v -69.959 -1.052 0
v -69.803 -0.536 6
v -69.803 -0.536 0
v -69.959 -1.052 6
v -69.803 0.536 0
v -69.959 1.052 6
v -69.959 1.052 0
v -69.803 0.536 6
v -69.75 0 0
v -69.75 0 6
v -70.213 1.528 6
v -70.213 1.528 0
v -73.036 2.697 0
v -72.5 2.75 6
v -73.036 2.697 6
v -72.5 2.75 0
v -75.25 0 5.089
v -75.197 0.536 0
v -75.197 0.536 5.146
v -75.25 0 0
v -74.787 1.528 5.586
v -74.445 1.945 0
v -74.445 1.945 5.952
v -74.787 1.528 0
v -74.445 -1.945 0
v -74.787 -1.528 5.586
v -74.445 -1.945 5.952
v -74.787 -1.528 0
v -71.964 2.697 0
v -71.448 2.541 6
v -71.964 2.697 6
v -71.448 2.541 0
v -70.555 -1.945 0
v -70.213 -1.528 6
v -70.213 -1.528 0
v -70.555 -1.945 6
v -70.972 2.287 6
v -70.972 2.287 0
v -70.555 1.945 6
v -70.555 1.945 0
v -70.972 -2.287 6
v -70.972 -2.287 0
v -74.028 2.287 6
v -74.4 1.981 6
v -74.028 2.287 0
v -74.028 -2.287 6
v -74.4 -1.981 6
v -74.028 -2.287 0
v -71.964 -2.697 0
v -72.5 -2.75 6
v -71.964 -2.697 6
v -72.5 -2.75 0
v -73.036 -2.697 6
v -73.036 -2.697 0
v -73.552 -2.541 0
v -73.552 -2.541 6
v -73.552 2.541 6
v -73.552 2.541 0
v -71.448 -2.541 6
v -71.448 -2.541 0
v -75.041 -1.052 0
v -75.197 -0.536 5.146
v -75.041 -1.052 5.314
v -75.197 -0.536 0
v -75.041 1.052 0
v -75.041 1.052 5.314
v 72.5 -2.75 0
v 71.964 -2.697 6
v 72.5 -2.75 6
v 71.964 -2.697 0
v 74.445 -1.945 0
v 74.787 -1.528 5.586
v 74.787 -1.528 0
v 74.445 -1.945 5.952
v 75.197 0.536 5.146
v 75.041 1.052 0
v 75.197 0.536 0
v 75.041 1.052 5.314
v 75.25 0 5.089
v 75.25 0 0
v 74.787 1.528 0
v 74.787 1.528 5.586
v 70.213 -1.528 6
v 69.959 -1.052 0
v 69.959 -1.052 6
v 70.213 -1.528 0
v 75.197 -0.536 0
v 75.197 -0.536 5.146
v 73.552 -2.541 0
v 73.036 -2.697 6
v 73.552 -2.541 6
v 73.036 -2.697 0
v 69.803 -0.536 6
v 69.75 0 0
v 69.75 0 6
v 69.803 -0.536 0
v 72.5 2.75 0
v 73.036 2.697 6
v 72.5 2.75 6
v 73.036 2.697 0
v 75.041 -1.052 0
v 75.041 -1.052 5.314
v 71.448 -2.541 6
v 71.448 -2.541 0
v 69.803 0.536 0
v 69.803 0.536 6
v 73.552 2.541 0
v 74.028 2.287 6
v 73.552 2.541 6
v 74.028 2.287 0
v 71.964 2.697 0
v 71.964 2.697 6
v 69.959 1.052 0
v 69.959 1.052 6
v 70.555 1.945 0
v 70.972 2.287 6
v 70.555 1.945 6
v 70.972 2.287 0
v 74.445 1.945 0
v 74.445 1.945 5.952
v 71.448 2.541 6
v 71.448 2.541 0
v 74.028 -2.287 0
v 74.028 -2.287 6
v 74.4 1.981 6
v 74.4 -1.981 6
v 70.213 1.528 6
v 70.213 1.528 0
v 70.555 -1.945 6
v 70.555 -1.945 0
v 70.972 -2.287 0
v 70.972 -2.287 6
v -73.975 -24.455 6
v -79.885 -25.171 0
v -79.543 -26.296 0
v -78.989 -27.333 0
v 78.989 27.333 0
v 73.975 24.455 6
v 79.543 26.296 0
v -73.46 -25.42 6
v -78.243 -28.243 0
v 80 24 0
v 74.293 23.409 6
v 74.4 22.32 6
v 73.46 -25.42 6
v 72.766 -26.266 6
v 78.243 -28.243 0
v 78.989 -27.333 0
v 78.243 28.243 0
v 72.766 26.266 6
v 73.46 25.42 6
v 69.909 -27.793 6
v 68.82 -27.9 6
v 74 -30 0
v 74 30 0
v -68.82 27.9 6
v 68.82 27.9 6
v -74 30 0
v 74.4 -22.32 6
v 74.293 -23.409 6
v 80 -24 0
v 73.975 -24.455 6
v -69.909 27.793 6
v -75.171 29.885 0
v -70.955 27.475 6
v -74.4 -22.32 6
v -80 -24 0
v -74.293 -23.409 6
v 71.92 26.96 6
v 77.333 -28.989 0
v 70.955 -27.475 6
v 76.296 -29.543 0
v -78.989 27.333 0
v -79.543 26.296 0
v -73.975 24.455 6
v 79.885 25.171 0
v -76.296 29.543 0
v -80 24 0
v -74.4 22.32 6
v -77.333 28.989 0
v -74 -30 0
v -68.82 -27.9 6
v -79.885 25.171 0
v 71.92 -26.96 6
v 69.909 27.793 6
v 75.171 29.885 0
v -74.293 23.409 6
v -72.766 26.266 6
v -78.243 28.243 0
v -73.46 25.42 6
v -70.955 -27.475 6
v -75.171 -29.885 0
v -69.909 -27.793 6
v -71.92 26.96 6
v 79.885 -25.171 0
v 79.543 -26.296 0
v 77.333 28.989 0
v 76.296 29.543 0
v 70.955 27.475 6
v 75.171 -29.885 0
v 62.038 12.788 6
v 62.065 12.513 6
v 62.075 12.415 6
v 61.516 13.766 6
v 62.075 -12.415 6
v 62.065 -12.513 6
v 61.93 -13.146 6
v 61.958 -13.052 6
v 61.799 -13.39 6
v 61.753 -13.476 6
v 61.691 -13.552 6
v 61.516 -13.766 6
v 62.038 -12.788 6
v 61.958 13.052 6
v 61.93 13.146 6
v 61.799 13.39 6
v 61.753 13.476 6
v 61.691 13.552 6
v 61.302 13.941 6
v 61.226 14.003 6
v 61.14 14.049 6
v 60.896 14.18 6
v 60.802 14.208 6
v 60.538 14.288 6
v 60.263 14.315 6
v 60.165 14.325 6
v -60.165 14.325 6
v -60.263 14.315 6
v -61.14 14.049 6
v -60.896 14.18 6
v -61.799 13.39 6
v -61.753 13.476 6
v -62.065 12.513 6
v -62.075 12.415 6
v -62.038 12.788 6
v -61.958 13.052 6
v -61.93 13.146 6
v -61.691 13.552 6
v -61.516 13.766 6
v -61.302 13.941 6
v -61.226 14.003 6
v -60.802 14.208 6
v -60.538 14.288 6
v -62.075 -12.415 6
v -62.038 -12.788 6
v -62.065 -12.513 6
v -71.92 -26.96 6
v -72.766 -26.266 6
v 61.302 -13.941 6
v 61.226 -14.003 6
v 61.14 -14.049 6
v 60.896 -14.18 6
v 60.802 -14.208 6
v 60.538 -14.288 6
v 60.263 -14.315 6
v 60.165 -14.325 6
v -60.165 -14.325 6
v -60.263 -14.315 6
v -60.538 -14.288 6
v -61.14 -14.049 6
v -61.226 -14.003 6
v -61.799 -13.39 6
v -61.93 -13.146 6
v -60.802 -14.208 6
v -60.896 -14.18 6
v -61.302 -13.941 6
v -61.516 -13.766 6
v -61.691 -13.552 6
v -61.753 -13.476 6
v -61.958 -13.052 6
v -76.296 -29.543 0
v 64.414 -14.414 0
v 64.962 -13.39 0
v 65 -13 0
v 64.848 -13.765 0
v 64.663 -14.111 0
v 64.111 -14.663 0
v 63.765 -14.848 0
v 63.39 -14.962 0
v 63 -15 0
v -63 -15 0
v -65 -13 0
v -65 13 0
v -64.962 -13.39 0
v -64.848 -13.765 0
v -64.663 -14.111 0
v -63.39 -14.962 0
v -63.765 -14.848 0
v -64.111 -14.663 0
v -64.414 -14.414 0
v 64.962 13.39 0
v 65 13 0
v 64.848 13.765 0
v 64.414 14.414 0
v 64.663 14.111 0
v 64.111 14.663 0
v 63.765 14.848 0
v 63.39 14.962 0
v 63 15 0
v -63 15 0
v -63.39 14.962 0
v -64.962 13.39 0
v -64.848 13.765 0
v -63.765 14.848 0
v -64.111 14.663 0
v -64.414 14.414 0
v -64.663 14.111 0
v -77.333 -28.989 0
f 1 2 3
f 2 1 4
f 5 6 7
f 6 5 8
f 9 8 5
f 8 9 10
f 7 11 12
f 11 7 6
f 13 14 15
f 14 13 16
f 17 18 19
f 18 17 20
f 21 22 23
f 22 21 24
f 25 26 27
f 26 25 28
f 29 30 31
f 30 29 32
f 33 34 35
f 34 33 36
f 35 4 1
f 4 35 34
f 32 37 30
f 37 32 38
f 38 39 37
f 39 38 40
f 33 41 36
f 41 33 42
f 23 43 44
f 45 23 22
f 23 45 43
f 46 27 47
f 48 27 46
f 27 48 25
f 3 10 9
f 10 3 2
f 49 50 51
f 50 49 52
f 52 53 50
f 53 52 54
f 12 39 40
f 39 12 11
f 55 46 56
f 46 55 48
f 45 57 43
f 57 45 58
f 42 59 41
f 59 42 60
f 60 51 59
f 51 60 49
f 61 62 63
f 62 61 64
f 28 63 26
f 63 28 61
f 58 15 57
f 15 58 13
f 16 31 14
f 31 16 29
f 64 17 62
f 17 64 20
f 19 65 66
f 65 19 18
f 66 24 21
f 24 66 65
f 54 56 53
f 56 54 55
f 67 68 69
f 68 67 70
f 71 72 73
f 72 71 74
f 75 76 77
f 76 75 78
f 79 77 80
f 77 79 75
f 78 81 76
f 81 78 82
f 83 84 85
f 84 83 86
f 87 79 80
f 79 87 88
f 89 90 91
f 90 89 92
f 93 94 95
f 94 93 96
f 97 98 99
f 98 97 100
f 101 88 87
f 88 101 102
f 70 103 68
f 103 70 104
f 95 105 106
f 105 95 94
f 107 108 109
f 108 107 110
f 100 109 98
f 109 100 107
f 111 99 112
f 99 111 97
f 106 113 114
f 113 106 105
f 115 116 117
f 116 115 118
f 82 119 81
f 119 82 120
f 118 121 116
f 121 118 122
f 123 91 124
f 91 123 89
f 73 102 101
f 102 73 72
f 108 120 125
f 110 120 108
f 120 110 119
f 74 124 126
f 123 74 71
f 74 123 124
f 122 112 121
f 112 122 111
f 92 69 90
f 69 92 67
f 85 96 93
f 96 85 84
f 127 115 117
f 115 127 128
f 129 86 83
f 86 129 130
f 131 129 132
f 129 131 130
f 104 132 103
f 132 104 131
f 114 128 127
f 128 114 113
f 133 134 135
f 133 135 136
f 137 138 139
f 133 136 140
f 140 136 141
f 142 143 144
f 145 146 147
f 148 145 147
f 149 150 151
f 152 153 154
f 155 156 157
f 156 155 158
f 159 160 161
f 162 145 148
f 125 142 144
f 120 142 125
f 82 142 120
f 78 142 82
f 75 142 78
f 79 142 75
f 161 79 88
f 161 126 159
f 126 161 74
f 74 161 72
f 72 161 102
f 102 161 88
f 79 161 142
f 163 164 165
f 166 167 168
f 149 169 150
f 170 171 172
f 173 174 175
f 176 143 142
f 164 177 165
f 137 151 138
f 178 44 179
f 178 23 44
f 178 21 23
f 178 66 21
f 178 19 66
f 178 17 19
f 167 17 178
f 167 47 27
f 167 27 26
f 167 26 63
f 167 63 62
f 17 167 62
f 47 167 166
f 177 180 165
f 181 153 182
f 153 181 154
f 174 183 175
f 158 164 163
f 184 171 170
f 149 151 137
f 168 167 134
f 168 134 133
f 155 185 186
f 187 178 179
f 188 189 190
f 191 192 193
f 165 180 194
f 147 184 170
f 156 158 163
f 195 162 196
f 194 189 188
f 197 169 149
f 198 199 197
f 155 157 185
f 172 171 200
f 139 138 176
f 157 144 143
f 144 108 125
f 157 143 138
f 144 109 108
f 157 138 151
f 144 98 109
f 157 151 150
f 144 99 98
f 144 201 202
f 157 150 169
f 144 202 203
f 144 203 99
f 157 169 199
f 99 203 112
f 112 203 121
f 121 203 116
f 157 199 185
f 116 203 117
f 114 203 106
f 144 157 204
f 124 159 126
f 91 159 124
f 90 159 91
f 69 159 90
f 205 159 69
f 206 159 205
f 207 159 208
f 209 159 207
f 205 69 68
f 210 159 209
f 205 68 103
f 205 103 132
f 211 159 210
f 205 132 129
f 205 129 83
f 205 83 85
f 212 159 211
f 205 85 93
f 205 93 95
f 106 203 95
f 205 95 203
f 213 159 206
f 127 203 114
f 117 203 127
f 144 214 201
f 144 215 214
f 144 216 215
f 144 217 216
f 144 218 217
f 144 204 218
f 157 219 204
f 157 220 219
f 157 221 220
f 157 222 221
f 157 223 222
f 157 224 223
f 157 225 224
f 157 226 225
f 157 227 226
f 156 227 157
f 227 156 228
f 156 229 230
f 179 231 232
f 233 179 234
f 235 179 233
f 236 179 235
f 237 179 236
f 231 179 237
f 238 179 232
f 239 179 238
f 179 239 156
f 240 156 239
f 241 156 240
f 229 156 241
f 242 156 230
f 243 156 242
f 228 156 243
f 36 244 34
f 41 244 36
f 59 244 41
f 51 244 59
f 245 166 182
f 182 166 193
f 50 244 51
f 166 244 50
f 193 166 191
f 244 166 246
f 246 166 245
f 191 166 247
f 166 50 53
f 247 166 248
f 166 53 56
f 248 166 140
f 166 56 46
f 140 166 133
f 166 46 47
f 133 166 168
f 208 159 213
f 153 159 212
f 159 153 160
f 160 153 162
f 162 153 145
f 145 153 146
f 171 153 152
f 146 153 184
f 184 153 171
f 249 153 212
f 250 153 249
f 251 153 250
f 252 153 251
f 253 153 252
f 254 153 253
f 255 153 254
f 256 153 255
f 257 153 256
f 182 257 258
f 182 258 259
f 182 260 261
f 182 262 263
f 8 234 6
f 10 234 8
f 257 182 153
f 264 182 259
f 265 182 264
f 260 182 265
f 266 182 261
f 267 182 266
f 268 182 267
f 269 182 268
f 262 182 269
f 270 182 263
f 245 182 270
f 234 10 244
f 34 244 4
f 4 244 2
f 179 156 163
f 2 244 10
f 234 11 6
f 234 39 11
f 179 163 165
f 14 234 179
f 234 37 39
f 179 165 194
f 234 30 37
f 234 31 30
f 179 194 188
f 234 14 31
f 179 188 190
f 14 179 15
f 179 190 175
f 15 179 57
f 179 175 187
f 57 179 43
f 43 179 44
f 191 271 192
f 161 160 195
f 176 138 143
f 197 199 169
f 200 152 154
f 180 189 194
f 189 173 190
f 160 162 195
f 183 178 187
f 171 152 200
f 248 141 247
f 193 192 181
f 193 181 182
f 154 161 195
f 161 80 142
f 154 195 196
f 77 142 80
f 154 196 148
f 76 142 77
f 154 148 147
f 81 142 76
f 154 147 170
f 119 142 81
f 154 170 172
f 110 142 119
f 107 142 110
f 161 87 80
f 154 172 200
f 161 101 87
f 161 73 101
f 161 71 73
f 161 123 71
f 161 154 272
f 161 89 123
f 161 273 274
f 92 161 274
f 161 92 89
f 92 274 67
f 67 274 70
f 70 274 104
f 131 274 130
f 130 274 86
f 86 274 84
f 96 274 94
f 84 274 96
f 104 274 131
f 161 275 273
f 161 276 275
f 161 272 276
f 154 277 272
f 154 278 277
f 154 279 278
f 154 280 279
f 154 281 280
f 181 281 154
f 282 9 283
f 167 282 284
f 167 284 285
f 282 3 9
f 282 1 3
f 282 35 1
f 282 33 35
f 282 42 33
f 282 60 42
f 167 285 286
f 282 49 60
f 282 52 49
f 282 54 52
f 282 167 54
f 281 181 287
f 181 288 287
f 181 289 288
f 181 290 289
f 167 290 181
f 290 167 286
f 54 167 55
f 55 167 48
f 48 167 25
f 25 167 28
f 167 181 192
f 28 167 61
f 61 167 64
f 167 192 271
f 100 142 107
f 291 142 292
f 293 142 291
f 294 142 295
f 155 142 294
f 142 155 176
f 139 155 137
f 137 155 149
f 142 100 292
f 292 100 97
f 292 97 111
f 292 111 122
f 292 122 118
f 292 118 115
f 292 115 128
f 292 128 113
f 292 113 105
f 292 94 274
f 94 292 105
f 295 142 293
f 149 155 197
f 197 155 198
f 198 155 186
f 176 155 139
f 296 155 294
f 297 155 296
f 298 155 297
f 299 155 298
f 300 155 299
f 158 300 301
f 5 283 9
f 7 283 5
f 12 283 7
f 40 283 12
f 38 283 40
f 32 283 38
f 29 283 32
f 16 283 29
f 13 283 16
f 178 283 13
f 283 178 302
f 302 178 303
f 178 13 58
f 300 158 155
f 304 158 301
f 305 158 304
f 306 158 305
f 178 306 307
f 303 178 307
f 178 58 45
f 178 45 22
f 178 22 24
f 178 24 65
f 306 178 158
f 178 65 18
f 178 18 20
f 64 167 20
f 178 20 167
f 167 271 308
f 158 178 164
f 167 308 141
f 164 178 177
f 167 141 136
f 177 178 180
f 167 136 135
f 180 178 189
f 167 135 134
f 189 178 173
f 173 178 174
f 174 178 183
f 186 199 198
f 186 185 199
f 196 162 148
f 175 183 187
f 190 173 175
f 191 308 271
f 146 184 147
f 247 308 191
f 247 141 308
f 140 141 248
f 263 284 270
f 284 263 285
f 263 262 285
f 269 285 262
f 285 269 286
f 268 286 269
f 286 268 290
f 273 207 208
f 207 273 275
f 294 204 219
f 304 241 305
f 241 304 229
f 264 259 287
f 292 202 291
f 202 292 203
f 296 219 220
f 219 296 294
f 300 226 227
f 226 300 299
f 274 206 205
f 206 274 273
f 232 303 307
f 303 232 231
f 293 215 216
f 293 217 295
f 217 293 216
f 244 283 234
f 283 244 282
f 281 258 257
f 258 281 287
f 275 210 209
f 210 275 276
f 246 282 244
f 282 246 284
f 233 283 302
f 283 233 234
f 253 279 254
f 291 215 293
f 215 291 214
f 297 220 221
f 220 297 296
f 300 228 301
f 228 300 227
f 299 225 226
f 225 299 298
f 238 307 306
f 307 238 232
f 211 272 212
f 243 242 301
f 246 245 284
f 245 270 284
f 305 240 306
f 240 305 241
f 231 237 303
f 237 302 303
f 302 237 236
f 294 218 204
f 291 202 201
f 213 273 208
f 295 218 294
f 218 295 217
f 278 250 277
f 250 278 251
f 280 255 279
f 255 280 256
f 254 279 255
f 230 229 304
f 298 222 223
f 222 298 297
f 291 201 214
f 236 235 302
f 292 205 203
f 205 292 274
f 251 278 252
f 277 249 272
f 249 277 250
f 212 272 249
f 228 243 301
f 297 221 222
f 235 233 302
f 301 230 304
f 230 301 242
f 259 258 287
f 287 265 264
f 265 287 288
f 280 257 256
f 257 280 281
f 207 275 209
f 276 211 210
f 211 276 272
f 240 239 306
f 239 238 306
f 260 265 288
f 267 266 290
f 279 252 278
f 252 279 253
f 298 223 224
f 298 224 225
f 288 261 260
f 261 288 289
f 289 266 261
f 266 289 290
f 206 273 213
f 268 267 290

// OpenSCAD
$fn = 32;

// ----------------------------------------------------------------------
// Display bezel: 160 x 60 mm frame, opening 130x30 mm
// ----------------------------------------------------------------------

// --- parameters (mm) ---
length = 160;             // frame outside length, X
width = 60;               // frame outside width, Y
frame_w = 15;             // frame width
thickness = 6;            // frame thickness
corner_r = 6;             // outside corner radius
chamfer = 0.93;           // outer wall taper
funnel = 0.94;            // inner opening taper
opening_l = 130;          // opening length
opening_w = 30;           // opening width
inner_r = 2;              // opening corner radius
hole_d = 5.5;             // mounting screw clearance
holes_per_side = 1;       // holes per short side
hole_inset = 7.5;         // hole centre inset from the outside edge

/* rounded-rectangle outlines, generated with loops */
module rounded_ring(l_nom, w_nom, r) {
  hull() {
    for (sx = [-1, 1]) for (sy = [-1, 1])
      translate([sx * (l_nom / 2 - r), sy * (w_nom / 2 - r)]) circle(r = r);
  }
}

difference() {
  /* frame body, drafted so the outer edge is a variable-depth chamfer */
  linear_extrude(height = thickness, scale = chamfer)
    rounded_ring(length, width, corner_r);
  /* viewing opening, drafted the other way for a funnel edge */
  linear_extrude(height = thickness + 2, scale = funnel)
    translate([0, 0, -1]) rounded_ring(opening_l, opening_w, inner_r);
  /* mounting screws through the frame lands */
  for (sx = [-1, 1]) for (i = [1 : holes_per_side])
    translate([sx * (length / 2 - hole_inset),
               (i - (holes_per_side + 1) / 2) * width * 0.5, -1])
      cylinder(h = thickness + 2, d = hole_d);
}
